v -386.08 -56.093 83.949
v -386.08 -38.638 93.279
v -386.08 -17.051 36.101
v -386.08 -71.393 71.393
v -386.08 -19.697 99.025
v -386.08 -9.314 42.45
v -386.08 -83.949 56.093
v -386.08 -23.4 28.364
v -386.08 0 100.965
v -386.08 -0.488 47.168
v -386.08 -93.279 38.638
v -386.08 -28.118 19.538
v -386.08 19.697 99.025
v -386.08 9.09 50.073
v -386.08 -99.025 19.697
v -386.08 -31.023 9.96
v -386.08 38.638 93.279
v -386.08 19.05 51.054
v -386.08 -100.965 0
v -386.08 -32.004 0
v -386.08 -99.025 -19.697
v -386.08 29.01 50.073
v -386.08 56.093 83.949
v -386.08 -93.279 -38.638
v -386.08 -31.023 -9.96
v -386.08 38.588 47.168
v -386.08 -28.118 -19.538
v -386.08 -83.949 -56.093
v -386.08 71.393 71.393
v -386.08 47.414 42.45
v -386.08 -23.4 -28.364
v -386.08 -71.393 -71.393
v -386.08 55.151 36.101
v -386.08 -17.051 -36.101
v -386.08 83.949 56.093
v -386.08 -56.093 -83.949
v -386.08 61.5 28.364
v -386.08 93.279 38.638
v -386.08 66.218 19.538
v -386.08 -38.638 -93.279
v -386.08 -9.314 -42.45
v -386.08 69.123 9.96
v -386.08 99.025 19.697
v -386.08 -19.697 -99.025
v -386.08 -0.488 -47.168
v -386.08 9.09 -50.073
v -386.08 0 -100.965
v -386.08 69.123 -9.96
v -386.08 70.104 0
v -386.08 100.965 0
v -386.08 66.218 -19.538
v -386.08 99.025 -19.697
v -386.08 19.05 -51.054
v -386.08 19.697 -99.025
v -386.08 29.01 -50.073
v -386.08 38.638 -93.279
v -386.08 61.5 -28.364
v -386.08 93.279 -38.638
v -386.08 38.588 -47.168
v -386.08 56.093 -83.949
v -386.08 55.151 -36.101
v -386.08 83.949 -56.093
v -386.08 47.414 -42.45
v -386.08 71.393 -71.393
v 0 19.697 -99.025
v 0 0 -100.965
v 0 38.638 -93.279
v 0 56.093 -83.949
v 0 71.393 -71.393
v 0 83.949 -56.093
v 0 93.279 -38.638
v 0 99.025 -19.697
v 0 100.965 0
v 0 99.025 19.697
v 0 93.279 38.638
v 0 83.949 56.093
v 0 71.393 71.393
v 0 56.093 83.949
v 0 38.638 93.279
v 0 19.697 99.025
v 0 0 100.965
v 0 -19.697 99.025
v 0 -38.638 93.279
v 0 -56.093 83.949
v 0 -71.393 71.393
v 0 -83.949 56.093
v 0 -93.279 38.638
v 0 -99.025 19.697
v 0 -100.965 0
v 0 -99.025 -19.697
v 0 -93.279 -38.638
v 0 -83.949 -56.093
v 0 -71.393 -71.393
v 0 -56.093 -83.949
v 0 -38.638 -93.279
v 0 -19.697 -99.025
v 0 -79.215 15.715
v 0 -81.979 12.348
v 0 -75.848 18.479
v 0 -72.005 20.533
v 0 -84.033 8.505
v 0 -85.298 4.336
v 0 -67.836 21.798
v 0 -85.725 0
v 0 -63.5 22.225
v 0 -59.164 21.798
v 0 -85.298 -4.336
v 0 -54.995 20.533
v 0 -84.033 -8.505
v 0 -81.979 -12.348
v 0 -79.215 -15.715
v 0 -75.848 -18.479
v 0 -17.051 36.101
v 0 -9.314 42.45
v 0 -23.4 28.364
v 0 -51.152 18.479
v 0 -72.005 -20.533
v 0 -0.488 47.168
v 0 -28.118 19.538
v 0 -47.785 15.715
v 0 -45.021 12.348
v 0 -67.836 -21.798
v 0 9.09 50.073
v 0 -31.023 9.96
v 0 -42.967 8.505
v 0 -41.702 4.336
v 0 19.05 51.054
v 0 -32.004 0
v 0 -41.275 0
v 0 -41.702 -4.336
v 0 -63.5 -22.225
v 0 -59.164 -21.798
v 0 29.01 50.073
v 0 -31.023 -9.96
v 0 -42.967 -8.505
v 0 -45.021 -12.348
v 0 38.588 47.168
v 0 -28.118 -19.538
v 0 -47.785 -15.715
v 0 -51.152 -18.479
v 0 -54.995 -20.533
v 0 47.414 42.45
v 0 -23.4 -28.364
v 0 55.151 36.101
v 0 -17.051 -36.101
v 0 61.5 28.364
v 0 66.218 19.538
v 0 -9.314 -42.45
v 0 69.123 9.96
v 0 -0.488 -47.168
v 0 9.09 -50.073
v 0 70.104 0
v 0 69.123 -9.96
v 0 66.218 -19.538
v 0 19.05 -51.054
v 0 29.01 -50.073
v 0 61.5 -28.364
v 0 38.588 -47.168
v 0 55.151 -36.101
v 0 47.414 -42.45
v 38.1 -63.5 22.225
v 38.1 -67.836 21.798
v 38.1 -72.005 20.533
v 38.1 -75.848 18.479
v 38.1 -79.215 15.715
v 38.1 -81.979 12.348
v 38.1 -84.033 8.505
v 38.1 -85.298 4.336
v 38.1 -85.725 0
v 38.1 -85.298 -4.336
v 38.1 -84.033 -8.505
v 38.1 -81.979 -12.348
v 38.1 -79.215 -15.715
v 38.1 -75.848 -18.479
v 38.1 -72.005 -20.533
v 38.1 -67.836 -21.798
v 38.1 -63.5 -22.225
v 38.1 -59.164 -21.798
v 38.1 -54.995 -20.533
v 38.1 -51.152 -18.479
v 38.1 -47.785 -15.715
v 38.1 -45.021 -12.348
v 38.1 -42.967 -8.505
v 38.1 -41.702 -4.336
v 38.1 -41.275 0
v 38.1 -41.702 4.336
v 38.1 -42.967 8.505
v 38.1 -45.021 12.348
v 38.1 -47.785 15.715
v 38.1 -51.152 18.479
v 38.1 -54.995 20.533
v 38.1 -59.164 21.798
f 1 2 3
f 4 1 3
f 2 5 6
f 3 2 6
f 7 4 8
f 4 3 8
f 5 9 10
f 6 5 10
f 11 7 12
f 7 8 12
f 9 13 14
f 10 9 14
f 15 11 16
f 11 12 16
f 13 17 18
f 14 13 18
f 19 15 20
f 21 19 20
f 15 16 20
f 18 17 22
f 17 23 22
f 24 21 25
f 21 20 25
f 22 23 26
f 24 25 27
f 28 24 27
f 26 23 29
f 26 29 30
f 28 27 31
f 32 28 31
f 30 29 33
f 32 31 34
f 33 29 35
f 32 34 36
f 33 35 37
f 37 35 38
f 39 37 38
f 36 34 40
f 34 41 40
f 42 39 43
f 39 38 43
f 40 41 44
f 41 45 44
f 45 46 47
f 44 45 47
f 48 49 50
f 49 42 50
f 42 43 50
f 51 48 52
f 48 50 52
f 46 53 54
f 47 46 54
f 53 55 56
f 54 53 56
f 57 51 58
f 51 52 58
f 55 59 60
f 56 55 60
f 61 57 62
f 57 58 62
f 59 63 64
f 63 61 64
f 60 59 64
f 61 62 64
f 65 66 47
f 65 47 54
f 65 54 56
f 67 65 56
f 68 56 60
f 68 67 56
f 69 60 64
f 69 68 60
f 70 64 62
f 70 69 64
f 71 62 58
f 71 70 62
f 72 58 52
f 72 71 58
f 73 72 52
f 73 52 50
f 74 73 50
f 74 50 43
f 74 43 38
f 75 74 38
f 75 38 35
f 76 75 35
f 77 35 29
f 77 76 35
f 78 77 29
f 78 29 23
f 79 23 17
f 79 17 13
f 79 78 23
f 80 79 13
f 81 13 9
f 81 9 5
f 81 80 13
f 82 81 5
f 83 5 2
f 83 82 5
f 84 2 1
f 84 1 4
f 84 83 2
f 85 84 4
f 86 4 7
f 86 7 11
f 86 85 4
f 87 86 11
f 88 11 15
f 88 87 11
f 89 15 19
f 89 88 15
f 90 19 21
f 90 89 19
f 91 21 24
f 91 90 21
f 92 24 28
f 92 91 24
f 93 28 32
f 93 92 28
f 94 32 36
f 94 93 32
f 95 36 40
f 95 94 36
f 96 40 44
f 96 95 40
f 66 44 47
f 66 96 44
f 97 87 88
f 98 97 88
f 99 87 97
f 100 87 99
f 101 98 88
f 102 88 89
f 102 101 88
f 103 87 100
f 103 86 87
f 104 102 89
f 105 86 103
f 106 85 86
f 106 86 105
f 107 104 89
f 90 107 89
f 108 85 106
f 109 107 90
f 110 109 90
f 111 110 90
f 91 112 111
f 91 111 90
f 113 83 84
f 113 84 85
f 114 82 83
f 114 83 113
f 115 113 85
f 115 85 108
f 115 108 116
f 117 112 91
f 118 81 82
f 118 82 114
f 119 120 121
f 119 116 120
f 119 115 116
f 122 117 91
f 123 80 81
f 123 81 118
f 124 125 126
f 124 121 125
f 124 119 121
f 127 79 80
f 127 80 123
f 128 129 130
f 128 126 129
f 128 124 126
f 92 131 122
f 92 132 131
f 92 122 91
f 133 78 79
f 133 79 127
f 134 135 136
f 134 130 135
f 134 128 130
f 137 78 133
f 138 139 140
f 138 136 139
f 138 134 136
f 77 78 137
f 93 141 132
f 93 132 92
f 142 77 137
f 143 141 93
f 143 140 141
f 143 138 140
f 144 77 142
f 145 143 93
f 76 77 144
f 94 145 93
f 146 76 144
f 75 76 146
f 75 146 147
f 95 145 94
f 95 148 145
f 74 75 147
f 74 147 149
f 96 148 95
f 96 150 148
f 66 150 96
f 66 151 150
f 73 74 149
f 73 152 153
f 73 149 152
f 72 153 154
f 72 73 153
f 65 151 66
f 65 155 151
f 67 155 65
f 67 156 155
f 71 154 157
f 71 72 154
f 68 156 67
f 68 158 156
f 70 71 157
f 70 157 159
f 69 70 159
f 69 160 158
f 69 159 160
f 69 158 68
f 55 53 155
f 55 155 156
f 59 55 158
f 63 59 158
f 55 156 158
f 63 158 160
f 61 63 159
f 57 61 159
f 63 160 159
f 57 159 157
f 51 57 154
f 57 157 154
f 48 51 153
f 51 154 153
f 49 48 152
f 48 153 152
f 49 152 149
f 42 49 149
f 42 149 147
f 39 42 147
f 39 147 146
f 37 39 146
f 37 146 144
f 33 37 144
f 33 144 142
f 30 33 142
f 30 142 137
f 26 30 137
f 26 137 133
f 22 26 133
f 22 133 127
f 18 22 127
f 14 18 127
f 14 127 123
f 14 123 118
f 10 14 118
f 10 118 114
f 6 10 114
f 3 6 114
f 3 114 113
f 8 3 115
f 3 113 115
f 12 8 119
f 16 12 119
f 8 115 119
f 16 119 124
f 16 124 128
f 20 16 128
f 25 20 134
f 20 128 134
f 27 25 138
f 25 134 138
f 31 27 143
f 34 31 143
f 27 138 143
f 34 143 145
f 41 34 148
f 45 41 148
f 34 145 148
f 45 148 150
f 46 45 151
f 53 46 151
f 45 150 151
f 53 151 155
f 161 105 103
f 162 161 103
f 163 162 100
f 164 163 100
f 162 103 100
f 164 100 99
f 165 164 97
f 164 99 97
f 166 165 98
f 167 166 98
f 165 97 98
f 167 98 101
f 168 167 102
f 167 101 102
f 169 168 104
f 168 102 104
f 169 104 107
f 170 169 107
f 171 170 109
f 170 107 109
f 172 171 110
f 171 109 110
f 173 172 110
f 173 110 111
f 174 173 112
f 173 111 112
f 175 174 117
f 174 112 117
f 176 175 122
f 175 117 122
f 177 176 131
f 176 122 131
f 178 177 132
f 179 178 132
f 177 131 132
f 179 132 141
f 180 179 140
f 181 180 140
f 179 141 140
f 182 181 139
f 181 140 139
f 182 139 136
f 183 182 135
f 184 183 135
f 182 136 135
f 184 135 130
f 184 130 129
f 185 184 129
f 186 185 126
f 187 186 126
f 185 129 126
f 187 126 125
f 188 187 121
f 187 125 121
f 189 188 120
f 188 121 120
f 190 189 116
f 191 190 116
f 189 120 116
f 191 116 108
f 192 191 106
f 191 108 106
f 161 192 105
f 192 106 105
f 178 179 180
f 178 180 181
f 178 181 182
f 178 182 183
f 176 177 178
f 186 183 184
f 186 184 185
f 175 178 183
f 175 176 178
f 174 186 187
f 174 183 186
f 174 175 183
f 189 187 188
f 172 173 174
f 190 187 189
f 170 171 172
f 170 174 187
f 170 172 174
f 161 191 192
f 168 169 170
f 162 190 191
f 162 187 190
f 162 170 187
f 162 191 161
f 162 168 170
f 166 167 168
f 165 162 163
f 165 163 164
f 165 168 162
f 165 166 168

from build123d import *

# Parameters (mm, degrees)
SKETCH1_R           = 100.965
BOSS_EXTRUDE1_DEPTH = 386.08
SKETCH2_R           = 51.054
CUT_EXTRUDE1_DEPTH  = 412.637739827
SKETCH3_R           = 22.225
BOSS_EXTRUDE2_DEPTH = 38.1


with BuildPart() as part:
    # Sketch1 → Boss-Extrude1 (new body)
    with BuildSketch(Plane(origin=(0, 0, 0), x_dir=(0, 0, -1), z_dir=(1, 0, 0))):
        Circle(SKETCH1_R)
    extrude(amount=-BOSS_EXTRUDE1_DEPTH)

    # Sketch2 → Cut-Extrude1 (cut, through all)
    with BuildSketch(Plane(origin=(0, 0, 0), x_dir=(0, 0, -1), z_dir=(1, 0, 0))):
        with Locations((0, 19.05)):
            Circle(SKETCH2_R)
    extrude(amount=-CUT_EXTRUDE1_DEPTH, mode=Mode.SUBTRACT)

    # Sketch3 → Boss-Extrude2 (add)
    with BuildSketch(Plane(origin=(0, 0, 0), x_dir=(0, 0, -1), z_dir=(1, 0, 0))):
        with Locations(Location((0, -63.5, 0), (0, 0, 180))):
            Circle(SKETCH3_R)
    extrude(amount=BOSS_EXTRUDE2_DEPTH)


solid = part.part
